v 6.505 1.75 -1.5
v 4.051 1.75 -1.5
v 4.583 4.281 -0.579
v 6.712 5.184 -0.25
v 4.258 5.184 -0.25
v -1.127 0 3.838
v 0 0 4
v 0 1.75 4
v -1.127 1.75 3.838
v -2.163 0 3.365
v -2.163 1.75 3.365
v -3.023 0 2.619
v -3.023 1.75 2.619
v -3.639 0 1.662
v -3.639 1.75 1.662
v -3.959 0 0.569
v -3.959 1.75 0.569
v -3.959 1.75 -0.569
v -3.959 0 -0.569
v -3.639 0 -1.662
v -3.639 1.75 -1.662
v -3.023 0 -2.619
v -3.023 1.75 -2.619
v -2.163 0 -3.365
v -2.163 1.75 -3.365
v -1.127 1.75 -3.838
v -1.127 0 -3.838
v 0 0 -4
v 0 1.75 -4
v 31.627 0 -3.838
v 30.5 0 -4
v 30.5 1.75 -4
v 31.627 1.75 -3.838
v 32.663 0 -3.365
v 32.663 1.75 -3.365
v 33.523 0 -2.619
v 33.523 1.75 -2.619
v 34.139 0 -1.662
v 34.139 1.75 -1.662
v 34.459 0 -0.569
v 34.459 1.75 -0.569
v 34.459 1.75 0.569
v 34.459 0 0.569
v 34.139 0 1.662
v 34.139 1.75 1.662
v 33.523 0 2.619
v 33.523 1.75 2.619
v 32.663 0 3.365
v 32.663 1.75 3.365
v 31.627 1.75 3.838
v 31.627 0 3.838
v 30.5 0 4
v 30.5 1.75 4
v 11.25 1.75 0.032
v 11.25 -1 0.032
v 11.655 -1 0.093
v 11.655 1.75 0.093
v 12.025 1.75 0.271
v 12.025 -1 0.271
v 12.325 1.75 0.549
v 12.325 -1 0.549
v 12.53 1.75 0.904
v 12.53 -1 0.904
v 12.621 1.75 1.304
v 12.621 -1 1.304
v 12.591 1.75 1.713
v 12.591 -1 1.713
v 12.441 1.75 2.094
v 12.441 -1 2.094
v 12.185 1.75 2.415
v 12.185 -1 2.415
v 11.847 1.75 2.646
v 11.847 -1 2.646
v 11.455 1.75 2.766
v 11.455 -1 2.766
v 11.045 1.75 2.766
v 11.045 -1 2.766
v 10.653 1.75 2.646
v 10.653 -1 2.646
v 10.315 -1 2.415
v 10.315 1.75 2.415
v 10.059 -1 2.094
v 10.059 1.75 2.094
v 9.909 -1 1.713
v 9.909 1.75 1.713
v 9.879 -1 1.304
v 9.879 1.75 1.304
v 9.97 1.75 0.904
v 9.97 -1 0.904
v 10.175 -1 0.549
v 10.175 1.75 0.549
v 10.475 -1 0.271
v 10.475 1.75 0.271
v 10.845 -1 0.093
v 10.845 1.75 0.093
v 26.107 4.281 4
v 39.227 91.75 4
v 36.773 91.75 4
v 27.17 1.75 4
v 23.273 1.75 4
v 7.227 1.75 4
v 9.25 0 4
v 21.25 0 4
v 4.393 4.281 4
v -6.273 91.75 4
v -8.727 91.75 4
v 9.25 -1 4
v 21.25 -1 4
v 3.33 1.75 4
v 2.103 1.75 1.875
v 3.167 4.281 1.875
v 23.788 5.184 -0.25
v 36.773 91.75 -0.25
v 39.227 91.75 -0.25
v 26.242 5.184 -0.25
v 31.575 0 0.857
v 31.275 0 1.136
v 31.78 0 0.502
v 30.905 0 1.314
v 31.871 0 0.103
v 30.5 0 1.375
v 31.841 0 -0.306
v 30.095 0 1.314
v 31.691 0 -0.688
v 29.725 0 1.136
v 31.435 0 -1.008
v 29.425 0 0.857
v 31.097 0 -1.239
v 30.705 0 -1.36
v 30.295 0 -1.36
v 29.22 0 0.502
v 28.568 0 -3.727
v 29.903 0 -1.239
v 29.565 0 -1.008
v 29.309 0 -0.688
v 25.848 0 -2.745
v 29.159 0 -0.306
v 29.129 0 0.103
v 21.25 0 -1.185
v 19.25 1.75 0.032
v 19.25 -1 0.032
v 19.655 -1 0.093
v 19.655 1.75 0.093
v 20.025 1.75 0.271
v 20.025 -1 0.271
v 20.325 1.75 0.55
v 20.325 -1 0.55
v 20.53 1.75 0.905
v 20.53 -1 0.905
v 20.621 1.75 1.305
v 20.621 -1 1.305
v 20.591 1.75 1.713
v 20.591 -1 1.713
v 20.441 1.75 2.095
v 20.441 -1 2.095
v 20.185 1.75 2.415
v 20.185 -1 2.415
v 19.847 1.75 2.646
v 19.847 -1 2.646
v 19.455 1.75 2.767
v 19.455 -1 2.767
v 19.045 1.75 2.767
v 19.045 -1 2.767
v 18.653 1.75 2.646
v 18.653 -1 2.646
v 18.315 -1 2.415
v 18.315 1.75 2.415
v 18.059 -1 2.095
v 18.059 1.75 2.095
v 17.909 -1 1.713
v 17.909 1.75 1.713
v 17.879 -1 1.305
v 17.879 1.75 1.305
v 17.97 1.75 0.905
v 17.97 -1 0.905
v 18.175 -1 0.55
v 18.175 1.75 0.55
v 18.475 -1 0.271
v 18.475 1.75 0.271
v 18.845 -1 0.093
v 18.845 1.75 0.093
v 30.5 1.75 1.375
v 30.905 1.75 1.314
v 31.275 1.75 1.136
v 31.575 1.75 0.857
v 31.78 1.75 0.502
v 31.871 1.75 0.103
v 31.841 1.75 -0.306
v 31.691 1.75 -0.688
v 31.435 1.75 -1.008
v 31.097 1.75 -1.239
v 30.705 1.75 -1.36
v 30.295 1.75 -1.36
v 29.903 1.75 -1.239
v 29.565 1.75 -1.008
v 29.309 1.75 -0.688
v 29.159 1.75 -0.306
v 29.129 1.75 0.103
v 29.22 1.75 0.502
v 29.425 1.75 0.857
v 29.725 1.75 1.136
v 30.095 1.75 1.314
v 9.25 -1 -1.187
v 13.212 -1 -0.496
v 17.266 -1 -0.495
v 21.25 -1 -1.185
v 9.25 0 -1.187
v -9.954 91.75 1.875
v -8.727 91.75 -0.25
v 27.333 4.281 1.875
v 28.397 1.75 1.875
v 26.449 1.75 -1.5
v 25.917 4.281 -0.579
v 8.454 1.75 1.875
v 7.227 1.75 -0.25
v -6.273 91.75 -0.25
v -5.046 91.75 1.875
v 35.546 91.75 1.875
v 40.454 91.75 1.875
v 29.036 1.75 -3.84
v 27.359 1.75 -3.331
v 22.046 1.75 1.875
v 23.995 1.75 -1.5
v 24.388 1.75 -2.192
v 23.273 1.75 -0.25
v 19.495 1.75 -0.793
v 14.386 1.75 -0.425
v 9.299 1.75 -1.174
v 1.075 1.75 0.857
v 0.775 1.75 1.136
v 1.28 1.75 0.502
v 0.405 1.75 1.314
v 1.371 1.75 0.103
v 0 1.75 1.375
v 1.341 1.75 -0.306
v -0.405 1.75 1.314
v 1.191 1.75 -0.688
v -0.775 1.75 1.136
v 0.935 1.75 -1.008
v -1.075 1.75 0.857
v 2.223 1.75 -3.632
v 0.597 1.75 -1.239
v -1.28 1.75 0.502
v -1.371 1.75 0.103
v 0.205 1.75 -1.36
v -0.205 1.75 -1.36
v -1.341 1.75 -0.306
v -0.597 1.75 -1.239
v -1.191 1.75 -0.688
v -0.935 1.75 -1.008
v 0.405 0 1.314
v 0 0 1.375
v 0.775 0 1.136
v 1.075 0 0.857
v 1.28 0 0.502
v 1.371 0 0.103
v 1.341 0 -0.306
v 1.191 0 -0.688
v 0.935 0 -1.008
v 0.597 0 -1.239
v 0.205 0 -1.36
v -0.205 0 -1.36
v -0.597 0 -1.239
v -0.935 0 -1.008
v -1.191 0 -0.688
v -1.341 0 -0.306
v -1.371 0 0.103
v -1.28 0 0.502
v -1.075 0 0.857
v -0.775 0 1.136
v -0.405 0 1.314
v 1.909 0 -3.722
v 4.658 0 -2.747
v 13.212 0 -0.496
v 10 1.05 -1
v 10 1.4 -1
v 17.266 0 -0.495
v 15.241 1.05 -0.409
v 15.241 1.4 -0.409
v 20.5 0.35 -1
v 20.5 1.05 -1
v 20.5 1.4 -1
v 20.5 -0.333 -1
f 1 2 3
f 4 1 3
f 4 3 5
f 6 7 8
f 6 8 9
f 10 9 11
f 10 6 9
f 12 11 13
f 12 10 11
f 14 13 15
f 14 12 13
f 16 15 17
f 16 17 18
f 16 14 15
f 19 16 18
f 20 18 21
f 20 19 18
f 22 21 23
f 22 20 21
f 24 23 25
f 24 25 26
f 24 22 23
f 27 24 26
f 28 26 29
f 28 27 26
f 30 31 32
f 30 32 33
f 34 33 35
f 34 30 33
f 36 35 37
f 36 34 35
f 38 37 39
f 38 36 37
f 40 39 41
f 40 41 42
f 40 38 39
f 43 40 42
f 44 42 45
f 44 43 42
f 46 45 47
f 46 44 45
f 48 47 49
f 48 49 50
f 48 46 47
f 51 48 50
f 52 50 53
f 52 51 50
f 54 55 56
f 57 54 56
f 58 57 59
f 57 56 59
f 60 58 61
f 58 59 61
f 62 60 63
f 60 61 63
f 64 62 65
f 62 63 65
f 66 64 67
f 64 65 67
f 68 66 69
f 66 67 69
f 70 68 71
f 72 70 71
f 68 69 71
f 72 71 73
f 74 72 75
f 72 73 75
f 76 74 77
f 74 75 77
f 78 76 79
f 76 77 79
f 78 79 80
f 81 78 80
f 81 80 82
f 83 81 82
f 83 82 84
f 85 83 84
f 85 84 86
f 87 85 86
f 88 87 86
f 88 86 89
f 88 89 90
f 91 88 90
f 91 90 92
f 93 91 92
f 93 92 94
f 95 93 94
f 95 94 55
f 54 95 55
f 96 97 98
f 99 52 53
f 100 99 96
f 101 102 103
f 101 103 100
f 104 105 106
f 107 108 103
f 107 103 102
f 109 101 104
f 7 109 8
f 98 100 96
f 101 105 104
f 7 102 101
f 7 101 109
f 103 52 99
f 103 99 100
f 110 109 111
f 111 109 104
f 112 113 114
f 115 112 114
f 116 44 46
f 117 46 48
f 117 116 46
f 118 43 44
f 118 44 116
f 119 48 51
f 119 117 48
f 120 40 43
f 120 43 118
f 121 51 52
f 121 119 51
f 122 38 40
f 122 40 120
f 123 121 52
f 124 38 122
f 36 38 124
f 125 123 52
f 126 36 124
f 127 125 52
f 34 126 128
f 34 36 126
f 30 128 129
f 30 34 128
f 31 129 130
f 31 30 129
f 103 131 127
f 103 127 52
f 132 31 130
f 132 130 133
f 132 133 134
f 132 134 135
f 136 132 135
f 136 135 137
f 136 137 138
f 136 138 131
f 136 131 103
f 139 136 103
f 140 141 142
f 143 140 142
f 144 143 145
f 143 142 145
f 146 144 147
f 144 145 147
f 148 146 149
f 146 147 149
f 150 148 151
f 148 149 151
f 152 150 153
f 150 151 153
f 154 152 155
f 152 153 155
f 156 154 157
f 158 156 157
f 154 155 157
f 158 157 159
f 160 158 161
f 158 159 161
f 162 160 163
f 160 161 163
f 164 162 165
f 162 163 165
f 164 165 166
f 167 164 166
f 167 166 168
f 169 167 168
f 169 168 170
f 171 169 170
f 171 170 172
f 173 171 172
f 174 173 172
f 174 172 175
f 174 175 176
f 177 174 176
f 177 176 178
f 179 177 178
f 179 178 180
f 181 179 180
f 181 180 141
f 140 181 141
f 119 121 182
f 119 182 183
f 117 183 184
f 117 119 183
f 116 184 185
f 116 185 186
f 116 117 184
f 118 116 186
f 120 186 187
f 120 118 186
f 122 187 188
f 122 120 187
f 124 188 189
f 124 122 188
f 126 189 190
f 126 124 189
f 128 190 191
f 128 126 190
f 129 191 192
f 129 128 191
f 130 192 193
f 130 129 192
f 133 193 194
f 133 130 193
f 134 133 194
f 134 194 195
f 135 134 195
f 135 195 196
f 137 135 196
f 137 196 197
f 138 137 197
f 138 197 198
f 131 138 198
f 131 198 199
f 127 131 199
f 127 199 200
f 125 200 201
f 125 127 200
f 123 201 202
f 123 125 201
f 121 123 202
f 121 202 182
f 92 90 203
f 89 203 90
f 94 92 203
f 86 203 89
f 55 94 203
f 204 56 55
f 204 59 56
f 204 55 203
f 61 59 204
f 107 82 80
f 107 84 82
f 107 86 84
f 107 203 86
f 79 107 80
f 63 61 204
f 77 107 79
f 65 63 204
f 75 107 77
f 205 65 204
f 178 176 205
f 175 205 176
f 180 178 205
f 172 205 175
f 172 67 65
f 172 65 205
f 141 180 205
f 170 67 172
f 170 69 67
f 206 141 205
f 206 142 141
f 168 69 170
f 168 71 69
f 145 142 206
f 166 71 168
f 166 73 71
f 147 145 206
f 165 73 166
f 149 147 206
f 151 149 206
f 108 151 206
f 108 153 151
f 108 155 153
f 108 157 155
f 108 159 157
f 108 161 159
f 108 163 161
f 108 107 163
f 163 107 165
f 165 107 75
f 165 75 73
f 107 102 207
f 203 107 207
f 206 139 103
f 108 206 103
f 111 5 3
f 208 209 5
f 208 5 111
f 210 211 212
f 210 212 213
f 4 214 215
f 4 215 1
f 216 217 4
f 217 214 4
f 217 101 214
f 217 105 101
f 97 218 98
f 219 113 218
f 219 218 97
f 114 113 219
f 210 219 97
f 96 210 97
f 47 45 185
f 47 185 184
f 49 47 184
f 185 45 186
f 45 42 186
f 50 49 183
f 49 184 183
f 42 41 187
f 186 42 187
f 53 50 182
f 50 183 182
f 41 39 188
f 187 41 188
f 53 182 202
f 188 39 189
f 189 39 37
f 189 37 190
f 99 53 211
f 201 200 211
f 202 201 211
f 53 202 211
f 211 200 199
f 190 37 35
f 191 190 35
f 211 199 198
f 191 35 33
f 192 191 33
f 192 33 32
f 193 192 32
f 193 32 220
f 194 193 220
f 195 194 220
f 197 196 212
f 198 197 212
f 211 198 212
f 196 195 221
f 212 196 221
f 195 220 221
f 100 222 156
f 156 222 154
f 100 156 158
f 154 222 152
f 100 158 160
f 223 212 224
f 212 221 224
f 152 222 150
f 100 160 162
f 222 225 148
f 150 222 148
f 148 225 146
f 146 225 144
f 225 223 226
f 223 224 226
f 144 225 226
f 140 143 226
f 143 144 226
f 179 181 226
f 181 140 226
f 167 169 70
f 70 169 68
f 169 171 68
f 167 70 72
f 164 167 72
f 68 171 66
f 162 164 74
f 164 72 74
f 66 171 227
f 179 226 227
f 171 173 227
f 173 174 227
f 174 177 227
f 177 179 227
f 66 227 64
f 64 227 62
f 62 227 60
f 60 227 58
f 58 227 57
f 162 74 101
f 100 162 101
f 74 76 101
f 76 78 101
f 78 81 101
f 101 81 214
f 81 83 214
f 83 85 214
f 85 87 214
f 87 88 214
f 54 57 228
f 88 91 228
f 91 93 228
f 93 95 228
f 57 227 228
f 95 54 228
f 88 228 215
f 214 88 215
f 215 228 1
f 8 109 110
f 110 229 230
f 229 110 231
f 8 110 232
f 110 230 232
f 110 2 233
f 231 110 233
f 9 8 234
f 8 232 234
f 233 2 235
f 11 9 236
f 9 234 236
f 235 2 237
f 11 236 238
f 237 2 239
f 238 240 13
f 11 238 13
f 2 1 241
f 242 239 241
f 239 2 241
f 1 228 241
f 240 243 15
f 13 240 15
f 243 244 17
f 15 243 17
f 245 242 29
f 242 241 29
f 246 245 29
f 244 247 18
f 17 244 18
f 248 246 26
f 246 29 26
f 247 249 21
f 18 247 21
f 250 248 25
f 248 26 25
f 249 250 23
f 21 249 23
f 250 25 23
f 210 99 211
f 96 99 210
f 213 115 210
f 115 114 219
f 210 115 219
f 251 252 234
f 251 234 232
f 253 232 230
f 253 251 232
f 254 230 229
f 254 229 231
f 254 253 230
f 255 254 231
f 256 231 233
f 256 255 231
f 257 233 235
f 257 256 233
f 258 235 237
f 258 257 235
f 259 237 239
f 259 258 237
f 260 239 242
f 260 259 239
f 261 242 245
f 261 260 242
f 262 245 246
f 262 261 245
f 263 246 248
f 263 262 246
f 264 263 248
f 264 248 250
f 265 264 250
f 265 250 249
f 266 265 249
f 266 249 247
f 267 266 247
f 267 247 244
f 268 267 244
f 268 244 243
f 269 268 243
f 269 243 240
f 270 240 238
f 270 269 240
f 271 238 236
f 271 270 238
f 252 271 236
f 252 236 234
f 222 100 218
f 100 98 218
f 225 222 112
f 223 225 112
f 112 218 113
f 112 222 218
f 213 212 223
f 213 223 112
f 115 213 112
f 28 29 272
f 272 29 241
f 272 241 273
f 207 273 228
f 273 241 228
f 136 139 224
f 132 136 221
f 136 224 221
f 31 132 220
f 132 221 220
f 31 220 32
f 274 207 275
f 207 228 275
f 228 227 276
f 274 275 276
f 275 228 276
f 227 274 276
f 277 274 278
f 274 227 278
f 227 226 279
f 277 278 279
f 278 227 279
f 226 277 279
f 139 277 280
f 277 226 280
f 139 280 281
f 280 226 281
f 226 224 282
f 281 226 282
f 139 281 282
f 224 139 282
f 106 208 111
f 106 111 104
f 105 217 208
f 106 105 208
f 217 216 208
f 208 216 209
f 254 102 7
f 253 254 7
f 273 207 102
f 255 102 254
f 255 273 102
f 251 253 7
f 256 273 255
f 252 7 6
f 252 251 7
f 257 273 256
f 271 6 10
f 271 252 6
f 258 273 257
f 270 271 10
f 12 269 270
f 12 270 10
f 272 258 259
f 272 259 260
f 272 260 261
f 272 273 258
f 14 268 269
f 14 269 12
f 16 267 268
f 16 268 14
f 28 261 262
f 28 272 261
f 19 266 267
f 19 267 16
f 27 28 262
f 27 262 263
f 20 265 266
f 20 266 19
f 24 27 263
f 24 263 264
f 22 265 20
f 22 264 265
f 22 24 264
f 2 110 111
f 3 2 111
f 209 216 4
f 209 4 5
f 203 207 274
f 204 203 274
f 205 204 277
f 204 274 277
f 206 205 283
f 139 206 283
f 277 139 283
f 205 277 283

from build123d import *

# Parameters (mm, degrees)
SKETCH2_R                        = 1.375
BOSS_EXTRUDE1_DEPTH              = 1.75
CUT_EXTRUDE1_DEPTH               = 10
CHAMFER1_SIZE                    = 1.25
CHAMFER1_SIZE2                   = 3.434346774
CHAMFER1_EDGE_2_SIZE             = 1.25
CHAMFER1_EDGE_2_SIZE2            = 2.552275757
CHAMFER1_EDGE_3_SIZE             = 1.25
CHAMFER1_EDGE_3_SIZE2            = 2.552275757
CHAMFER1_OF_MIRROR1_SIZE2        = 3.434346774
CHAMFER1_OF_MIRROR1_SIZE         = 1.25
CHAMFER1_EDGE_2_OF_MIRROR1_SIZE2 = 2.552275757
CHAMFER1_EDGE_2_OF_MIRROR1_SIZE  = 1.25
CHAMFER1_EDGE_3_OF_MIRROR1_SIZE2 = 2.552275757
CHAMFER1_EDGE_3_OF_MIRROR1_SIZE  = 1.25
BOSS_EXTRUDE2_DEPTH              = 1
SKETCH8_R                        = 1.375
CUT_EXTRUDE2_DEPTH               = 102.267307157


with BuildPart() as part:
    # Sketch2 → Boss-Extrude1 (new body)
    with BuildSketch(Plane(origin=(0, 0, 0), x_dir=(1, 0, 0), z_dir=(0, 1, 0))):
        with BuildLine():
            Line((0, 4), (30.5, 4))
            ThreePointArc((30.5, 4), (34.5, 0), (30.5, -4))
            Line((30.5, -4), (0, -4))
            ThreePointArc((0, -4), (-4, 0), (0, 4))
        make_face()
        with Locations(Location((0, 0, 0), (0, 0, 270))):
            Circle(SKETCH2_R, mode=Mode.SUBTRACT)
        with Locations(Location((30.5, 0, 0), (0, 0, 270))):
            Circle(SKETCH2_R, mode=Mode.SUBTRACT)
    extrude(amount=BOSS_EXTRUDE1_DEPTH)

    # Sketch3 → Cut-Extrude1 (cut)
    with BuildSketch(Plane(origin=(0, 1.75, 0), x_dir=(1, 0, 0), z_dir=(0, 1, 0))):
        with BuildLine():
            Line((30.5, 4), (0, 4))
            add(Edge.make_bspline(
                [(0, 4), (1.392554105, 4), (4.712816119, 2.730302251), (11.200086309, 0.212313893), (19.274696625, 0.212313893), (25.842577961, 2.730302251), (29.028765437, 4), (30.5, 4)],
                knots=[0, 0, 0, 0, 0.131328662, 0.332777634, 0.667222366, 0.868671338, 1, 1, 1, 1], degree=3))
        make_face()
    extrude(amount=-CUT_EXTRUDE1_DEPTH, mode=Mode.SUBTRACT)

    # Sketch4 → Loft1 section 0
    with BuildSketch(Plane(origin=(0, 1.75, 0), x_dir=(1, 0, 0), z_dir=(0, 1, 0))):
        with BuildLine():
            Line((8.453738644, -1.875), (7.226869322, 0.25))
            Line((7.226869322, 0.25), (4.773130678, 0.25))
            Line((4.773130678, 0.25), (3.546261356, -1.875))
            Line((3.546261356, -1.875), (4.773130678, -4))
            Line((4.773130678, -4), (7.226869322, -4))
            Line((7.226869322, -4), (8.453738644, -1.875))
        make_face()
    # Sketch5 → Loft1 section 1
    with BuildSketch(Plane(origin=(0, 91.75, 0), x_dir=(1, 0, 0), z_dir=(0, 1, 0))):
        with BuildLine():
            Line((-5.046261356, -1.875), (-6.273130678, 0.25))
            Line((-6.273130678, 0.25), (-8.726869322, 0.25))
            Line((-8.726869322, 0.25), (-9.953738644, -1.875))
            Line((-9.953738644, -1.875), (-8.726869322, -4))
            Line((-8.726869322, -4), (-6.273130678, -4))
            Line((-6.273130678, -4), (-5.046261356, -1.875))
        make_face()
    loft1 = loft()

    # Chamfer1
    chamfer1_edges = [part.edges().sort_by_distance(p)[0] for p in [
        (6, 1.75, -0.25),
    ]]
    chamfer1_side = [part.faces().sort_by_distance(p)[0] for p in [
        (15.962582186, 1.75, 0.665337448),
    ]]
    chamfer(chamfer1_edges, length=CHAMFER1_SIZE, length2=CHAMFER1_SIZE2, reference=chamfer1_side[0])

    # Chamfer1 edge 2
    chamfer1_edge_2_edges = [part.edges().sort_by_distance(p)[0] for p in [
        (4.159696017, 1.75, 0.8125),
    ]]
    chamfer1_edge_2_side = [part.faces().sort_by_distance(p)[0] for p in [
        (15.962582186, 1.75, 0.665337448),
    ]]
    chamfer(chamfer1_edge_2_edges, length=CHAMFER1_EDGE_2_SIZE, length2=CHAMFER1_EDGE_2_SIZE2, reference=chamfer1_edge_2_side[0])

    # Chamfer1 edge 3
    chamfer1_edge_3_edges = [part.edges().sort_by_distance(p)[0] for p in [
        (4.159696017, 1.75, 2.9375),
    ]]
    chamfer1_edge_3_side = [part.faces().sort_by_distance(p)[0] for p in [
        (15.962582186, 1.75, 0.665337448),
    ]]
    chamfer(chamfer1_edge_3_edges, length=CHAMFER1_EDGE_3_SIZE, length2=CHAMFER1_EDGE_3_SIZE2, reference=chamfer1_edge_3_side[0])

    # Mirror1: Loft1 across plane
    add(loft1.mirror(Plane(origin=(15.25, 0, 0), x_dir=(0, 0, 1), z_dir=(1, 0, 0))))

    # Chamfer1 of Mirror1
    chamfer1_of_mirror1_edges = [part.edges().sort_by_distance(p)[0] for p in [
        (24.5, 1.75, -0.25),
    ]]
    chamfer(chamfer1_of_mirror1_edges, length=CHAMFER1_OF_MIRROR1_SIZE, length2=CHAMFER1_OF_MIRROR1_SIZE2)

    # Chamfer1 edge 2 of Mirror1
    chamfer1_edge_2_of_mirror1_edges = [part.edges().sort_by_distance(p)[0] for p in [
        (26.340303983, 1.75, 0.8125),
    ]]
    chamfer(chamfer1_edge_2_of_mirror1_edges, length=CHAMFER1_EDGE_2_OF_MIRROR1_SIZE, length2=CHAMFER1_EDGE_2_OF_MIRROR1_SIZE2)

    # Chamfer1 edge 3 of Mirror1
    chamfer1_edge_3_of_mirror1_edges = [part.edges().sort_by_distance(p)[0] for p in [
        (26.340303983, 1.75, 2.9375),
    ]]
    chamfer(chamfer1_edge_3_of_mirror1_edges, length=CHAMFER1_EDGE_3_OF_MIRROR1_SIZE, length2=CHAMFER1_EDGE_3_OF_MIRROR1_SIZE2)

    # Sketch6 → Boss-Extrude2 (add)
    with BuildSketch(Plane.XZ):
        with BuildLine():
            Line((9.25, 4), (9.25, -1.186704991))
            add(Edge.make_bspline(
                [(9.25, -1.186704991), (9.498756449, -1.120525729), (13.135912237, -0.212313893), (17.336765902, -0.212313893), (21.001177664, -1.119553839), (21.25, -1.185159308)],
                knots=[0.308100917, 0.308100917, 0.308100917, 0.308100917, 0.332777634, 0.667222366, 0.691706881, 0.691706881, 0.691706881, 0.691706881], degree=3))
            Line((21.25, -1.185159308), (21.25, 4))
            Line((21.25, 4), (9.25, 4))
        make_face()
    extrude(amount=BOSS_EXTRUDE2_DEPTH)

    # Sketch8 → Cut-Extrude2 (cut, through all)
    with BuildSketch(Plane.XZ.offset(1)):
        with Locations(Location((11.249999996, 1.406776311, 0), (0, 0, 270))):
            Circle(SKETCH8_R)
        with Locations(Location((19.250000004, 1.407291539, 0), (0, 0, 270))):
            Circle(SKETCH8_R)
    extrude(amount=-CUT_EXTRUDE2_DEPTH, mode=Mode.SUBTRACT)


solid = part.part
